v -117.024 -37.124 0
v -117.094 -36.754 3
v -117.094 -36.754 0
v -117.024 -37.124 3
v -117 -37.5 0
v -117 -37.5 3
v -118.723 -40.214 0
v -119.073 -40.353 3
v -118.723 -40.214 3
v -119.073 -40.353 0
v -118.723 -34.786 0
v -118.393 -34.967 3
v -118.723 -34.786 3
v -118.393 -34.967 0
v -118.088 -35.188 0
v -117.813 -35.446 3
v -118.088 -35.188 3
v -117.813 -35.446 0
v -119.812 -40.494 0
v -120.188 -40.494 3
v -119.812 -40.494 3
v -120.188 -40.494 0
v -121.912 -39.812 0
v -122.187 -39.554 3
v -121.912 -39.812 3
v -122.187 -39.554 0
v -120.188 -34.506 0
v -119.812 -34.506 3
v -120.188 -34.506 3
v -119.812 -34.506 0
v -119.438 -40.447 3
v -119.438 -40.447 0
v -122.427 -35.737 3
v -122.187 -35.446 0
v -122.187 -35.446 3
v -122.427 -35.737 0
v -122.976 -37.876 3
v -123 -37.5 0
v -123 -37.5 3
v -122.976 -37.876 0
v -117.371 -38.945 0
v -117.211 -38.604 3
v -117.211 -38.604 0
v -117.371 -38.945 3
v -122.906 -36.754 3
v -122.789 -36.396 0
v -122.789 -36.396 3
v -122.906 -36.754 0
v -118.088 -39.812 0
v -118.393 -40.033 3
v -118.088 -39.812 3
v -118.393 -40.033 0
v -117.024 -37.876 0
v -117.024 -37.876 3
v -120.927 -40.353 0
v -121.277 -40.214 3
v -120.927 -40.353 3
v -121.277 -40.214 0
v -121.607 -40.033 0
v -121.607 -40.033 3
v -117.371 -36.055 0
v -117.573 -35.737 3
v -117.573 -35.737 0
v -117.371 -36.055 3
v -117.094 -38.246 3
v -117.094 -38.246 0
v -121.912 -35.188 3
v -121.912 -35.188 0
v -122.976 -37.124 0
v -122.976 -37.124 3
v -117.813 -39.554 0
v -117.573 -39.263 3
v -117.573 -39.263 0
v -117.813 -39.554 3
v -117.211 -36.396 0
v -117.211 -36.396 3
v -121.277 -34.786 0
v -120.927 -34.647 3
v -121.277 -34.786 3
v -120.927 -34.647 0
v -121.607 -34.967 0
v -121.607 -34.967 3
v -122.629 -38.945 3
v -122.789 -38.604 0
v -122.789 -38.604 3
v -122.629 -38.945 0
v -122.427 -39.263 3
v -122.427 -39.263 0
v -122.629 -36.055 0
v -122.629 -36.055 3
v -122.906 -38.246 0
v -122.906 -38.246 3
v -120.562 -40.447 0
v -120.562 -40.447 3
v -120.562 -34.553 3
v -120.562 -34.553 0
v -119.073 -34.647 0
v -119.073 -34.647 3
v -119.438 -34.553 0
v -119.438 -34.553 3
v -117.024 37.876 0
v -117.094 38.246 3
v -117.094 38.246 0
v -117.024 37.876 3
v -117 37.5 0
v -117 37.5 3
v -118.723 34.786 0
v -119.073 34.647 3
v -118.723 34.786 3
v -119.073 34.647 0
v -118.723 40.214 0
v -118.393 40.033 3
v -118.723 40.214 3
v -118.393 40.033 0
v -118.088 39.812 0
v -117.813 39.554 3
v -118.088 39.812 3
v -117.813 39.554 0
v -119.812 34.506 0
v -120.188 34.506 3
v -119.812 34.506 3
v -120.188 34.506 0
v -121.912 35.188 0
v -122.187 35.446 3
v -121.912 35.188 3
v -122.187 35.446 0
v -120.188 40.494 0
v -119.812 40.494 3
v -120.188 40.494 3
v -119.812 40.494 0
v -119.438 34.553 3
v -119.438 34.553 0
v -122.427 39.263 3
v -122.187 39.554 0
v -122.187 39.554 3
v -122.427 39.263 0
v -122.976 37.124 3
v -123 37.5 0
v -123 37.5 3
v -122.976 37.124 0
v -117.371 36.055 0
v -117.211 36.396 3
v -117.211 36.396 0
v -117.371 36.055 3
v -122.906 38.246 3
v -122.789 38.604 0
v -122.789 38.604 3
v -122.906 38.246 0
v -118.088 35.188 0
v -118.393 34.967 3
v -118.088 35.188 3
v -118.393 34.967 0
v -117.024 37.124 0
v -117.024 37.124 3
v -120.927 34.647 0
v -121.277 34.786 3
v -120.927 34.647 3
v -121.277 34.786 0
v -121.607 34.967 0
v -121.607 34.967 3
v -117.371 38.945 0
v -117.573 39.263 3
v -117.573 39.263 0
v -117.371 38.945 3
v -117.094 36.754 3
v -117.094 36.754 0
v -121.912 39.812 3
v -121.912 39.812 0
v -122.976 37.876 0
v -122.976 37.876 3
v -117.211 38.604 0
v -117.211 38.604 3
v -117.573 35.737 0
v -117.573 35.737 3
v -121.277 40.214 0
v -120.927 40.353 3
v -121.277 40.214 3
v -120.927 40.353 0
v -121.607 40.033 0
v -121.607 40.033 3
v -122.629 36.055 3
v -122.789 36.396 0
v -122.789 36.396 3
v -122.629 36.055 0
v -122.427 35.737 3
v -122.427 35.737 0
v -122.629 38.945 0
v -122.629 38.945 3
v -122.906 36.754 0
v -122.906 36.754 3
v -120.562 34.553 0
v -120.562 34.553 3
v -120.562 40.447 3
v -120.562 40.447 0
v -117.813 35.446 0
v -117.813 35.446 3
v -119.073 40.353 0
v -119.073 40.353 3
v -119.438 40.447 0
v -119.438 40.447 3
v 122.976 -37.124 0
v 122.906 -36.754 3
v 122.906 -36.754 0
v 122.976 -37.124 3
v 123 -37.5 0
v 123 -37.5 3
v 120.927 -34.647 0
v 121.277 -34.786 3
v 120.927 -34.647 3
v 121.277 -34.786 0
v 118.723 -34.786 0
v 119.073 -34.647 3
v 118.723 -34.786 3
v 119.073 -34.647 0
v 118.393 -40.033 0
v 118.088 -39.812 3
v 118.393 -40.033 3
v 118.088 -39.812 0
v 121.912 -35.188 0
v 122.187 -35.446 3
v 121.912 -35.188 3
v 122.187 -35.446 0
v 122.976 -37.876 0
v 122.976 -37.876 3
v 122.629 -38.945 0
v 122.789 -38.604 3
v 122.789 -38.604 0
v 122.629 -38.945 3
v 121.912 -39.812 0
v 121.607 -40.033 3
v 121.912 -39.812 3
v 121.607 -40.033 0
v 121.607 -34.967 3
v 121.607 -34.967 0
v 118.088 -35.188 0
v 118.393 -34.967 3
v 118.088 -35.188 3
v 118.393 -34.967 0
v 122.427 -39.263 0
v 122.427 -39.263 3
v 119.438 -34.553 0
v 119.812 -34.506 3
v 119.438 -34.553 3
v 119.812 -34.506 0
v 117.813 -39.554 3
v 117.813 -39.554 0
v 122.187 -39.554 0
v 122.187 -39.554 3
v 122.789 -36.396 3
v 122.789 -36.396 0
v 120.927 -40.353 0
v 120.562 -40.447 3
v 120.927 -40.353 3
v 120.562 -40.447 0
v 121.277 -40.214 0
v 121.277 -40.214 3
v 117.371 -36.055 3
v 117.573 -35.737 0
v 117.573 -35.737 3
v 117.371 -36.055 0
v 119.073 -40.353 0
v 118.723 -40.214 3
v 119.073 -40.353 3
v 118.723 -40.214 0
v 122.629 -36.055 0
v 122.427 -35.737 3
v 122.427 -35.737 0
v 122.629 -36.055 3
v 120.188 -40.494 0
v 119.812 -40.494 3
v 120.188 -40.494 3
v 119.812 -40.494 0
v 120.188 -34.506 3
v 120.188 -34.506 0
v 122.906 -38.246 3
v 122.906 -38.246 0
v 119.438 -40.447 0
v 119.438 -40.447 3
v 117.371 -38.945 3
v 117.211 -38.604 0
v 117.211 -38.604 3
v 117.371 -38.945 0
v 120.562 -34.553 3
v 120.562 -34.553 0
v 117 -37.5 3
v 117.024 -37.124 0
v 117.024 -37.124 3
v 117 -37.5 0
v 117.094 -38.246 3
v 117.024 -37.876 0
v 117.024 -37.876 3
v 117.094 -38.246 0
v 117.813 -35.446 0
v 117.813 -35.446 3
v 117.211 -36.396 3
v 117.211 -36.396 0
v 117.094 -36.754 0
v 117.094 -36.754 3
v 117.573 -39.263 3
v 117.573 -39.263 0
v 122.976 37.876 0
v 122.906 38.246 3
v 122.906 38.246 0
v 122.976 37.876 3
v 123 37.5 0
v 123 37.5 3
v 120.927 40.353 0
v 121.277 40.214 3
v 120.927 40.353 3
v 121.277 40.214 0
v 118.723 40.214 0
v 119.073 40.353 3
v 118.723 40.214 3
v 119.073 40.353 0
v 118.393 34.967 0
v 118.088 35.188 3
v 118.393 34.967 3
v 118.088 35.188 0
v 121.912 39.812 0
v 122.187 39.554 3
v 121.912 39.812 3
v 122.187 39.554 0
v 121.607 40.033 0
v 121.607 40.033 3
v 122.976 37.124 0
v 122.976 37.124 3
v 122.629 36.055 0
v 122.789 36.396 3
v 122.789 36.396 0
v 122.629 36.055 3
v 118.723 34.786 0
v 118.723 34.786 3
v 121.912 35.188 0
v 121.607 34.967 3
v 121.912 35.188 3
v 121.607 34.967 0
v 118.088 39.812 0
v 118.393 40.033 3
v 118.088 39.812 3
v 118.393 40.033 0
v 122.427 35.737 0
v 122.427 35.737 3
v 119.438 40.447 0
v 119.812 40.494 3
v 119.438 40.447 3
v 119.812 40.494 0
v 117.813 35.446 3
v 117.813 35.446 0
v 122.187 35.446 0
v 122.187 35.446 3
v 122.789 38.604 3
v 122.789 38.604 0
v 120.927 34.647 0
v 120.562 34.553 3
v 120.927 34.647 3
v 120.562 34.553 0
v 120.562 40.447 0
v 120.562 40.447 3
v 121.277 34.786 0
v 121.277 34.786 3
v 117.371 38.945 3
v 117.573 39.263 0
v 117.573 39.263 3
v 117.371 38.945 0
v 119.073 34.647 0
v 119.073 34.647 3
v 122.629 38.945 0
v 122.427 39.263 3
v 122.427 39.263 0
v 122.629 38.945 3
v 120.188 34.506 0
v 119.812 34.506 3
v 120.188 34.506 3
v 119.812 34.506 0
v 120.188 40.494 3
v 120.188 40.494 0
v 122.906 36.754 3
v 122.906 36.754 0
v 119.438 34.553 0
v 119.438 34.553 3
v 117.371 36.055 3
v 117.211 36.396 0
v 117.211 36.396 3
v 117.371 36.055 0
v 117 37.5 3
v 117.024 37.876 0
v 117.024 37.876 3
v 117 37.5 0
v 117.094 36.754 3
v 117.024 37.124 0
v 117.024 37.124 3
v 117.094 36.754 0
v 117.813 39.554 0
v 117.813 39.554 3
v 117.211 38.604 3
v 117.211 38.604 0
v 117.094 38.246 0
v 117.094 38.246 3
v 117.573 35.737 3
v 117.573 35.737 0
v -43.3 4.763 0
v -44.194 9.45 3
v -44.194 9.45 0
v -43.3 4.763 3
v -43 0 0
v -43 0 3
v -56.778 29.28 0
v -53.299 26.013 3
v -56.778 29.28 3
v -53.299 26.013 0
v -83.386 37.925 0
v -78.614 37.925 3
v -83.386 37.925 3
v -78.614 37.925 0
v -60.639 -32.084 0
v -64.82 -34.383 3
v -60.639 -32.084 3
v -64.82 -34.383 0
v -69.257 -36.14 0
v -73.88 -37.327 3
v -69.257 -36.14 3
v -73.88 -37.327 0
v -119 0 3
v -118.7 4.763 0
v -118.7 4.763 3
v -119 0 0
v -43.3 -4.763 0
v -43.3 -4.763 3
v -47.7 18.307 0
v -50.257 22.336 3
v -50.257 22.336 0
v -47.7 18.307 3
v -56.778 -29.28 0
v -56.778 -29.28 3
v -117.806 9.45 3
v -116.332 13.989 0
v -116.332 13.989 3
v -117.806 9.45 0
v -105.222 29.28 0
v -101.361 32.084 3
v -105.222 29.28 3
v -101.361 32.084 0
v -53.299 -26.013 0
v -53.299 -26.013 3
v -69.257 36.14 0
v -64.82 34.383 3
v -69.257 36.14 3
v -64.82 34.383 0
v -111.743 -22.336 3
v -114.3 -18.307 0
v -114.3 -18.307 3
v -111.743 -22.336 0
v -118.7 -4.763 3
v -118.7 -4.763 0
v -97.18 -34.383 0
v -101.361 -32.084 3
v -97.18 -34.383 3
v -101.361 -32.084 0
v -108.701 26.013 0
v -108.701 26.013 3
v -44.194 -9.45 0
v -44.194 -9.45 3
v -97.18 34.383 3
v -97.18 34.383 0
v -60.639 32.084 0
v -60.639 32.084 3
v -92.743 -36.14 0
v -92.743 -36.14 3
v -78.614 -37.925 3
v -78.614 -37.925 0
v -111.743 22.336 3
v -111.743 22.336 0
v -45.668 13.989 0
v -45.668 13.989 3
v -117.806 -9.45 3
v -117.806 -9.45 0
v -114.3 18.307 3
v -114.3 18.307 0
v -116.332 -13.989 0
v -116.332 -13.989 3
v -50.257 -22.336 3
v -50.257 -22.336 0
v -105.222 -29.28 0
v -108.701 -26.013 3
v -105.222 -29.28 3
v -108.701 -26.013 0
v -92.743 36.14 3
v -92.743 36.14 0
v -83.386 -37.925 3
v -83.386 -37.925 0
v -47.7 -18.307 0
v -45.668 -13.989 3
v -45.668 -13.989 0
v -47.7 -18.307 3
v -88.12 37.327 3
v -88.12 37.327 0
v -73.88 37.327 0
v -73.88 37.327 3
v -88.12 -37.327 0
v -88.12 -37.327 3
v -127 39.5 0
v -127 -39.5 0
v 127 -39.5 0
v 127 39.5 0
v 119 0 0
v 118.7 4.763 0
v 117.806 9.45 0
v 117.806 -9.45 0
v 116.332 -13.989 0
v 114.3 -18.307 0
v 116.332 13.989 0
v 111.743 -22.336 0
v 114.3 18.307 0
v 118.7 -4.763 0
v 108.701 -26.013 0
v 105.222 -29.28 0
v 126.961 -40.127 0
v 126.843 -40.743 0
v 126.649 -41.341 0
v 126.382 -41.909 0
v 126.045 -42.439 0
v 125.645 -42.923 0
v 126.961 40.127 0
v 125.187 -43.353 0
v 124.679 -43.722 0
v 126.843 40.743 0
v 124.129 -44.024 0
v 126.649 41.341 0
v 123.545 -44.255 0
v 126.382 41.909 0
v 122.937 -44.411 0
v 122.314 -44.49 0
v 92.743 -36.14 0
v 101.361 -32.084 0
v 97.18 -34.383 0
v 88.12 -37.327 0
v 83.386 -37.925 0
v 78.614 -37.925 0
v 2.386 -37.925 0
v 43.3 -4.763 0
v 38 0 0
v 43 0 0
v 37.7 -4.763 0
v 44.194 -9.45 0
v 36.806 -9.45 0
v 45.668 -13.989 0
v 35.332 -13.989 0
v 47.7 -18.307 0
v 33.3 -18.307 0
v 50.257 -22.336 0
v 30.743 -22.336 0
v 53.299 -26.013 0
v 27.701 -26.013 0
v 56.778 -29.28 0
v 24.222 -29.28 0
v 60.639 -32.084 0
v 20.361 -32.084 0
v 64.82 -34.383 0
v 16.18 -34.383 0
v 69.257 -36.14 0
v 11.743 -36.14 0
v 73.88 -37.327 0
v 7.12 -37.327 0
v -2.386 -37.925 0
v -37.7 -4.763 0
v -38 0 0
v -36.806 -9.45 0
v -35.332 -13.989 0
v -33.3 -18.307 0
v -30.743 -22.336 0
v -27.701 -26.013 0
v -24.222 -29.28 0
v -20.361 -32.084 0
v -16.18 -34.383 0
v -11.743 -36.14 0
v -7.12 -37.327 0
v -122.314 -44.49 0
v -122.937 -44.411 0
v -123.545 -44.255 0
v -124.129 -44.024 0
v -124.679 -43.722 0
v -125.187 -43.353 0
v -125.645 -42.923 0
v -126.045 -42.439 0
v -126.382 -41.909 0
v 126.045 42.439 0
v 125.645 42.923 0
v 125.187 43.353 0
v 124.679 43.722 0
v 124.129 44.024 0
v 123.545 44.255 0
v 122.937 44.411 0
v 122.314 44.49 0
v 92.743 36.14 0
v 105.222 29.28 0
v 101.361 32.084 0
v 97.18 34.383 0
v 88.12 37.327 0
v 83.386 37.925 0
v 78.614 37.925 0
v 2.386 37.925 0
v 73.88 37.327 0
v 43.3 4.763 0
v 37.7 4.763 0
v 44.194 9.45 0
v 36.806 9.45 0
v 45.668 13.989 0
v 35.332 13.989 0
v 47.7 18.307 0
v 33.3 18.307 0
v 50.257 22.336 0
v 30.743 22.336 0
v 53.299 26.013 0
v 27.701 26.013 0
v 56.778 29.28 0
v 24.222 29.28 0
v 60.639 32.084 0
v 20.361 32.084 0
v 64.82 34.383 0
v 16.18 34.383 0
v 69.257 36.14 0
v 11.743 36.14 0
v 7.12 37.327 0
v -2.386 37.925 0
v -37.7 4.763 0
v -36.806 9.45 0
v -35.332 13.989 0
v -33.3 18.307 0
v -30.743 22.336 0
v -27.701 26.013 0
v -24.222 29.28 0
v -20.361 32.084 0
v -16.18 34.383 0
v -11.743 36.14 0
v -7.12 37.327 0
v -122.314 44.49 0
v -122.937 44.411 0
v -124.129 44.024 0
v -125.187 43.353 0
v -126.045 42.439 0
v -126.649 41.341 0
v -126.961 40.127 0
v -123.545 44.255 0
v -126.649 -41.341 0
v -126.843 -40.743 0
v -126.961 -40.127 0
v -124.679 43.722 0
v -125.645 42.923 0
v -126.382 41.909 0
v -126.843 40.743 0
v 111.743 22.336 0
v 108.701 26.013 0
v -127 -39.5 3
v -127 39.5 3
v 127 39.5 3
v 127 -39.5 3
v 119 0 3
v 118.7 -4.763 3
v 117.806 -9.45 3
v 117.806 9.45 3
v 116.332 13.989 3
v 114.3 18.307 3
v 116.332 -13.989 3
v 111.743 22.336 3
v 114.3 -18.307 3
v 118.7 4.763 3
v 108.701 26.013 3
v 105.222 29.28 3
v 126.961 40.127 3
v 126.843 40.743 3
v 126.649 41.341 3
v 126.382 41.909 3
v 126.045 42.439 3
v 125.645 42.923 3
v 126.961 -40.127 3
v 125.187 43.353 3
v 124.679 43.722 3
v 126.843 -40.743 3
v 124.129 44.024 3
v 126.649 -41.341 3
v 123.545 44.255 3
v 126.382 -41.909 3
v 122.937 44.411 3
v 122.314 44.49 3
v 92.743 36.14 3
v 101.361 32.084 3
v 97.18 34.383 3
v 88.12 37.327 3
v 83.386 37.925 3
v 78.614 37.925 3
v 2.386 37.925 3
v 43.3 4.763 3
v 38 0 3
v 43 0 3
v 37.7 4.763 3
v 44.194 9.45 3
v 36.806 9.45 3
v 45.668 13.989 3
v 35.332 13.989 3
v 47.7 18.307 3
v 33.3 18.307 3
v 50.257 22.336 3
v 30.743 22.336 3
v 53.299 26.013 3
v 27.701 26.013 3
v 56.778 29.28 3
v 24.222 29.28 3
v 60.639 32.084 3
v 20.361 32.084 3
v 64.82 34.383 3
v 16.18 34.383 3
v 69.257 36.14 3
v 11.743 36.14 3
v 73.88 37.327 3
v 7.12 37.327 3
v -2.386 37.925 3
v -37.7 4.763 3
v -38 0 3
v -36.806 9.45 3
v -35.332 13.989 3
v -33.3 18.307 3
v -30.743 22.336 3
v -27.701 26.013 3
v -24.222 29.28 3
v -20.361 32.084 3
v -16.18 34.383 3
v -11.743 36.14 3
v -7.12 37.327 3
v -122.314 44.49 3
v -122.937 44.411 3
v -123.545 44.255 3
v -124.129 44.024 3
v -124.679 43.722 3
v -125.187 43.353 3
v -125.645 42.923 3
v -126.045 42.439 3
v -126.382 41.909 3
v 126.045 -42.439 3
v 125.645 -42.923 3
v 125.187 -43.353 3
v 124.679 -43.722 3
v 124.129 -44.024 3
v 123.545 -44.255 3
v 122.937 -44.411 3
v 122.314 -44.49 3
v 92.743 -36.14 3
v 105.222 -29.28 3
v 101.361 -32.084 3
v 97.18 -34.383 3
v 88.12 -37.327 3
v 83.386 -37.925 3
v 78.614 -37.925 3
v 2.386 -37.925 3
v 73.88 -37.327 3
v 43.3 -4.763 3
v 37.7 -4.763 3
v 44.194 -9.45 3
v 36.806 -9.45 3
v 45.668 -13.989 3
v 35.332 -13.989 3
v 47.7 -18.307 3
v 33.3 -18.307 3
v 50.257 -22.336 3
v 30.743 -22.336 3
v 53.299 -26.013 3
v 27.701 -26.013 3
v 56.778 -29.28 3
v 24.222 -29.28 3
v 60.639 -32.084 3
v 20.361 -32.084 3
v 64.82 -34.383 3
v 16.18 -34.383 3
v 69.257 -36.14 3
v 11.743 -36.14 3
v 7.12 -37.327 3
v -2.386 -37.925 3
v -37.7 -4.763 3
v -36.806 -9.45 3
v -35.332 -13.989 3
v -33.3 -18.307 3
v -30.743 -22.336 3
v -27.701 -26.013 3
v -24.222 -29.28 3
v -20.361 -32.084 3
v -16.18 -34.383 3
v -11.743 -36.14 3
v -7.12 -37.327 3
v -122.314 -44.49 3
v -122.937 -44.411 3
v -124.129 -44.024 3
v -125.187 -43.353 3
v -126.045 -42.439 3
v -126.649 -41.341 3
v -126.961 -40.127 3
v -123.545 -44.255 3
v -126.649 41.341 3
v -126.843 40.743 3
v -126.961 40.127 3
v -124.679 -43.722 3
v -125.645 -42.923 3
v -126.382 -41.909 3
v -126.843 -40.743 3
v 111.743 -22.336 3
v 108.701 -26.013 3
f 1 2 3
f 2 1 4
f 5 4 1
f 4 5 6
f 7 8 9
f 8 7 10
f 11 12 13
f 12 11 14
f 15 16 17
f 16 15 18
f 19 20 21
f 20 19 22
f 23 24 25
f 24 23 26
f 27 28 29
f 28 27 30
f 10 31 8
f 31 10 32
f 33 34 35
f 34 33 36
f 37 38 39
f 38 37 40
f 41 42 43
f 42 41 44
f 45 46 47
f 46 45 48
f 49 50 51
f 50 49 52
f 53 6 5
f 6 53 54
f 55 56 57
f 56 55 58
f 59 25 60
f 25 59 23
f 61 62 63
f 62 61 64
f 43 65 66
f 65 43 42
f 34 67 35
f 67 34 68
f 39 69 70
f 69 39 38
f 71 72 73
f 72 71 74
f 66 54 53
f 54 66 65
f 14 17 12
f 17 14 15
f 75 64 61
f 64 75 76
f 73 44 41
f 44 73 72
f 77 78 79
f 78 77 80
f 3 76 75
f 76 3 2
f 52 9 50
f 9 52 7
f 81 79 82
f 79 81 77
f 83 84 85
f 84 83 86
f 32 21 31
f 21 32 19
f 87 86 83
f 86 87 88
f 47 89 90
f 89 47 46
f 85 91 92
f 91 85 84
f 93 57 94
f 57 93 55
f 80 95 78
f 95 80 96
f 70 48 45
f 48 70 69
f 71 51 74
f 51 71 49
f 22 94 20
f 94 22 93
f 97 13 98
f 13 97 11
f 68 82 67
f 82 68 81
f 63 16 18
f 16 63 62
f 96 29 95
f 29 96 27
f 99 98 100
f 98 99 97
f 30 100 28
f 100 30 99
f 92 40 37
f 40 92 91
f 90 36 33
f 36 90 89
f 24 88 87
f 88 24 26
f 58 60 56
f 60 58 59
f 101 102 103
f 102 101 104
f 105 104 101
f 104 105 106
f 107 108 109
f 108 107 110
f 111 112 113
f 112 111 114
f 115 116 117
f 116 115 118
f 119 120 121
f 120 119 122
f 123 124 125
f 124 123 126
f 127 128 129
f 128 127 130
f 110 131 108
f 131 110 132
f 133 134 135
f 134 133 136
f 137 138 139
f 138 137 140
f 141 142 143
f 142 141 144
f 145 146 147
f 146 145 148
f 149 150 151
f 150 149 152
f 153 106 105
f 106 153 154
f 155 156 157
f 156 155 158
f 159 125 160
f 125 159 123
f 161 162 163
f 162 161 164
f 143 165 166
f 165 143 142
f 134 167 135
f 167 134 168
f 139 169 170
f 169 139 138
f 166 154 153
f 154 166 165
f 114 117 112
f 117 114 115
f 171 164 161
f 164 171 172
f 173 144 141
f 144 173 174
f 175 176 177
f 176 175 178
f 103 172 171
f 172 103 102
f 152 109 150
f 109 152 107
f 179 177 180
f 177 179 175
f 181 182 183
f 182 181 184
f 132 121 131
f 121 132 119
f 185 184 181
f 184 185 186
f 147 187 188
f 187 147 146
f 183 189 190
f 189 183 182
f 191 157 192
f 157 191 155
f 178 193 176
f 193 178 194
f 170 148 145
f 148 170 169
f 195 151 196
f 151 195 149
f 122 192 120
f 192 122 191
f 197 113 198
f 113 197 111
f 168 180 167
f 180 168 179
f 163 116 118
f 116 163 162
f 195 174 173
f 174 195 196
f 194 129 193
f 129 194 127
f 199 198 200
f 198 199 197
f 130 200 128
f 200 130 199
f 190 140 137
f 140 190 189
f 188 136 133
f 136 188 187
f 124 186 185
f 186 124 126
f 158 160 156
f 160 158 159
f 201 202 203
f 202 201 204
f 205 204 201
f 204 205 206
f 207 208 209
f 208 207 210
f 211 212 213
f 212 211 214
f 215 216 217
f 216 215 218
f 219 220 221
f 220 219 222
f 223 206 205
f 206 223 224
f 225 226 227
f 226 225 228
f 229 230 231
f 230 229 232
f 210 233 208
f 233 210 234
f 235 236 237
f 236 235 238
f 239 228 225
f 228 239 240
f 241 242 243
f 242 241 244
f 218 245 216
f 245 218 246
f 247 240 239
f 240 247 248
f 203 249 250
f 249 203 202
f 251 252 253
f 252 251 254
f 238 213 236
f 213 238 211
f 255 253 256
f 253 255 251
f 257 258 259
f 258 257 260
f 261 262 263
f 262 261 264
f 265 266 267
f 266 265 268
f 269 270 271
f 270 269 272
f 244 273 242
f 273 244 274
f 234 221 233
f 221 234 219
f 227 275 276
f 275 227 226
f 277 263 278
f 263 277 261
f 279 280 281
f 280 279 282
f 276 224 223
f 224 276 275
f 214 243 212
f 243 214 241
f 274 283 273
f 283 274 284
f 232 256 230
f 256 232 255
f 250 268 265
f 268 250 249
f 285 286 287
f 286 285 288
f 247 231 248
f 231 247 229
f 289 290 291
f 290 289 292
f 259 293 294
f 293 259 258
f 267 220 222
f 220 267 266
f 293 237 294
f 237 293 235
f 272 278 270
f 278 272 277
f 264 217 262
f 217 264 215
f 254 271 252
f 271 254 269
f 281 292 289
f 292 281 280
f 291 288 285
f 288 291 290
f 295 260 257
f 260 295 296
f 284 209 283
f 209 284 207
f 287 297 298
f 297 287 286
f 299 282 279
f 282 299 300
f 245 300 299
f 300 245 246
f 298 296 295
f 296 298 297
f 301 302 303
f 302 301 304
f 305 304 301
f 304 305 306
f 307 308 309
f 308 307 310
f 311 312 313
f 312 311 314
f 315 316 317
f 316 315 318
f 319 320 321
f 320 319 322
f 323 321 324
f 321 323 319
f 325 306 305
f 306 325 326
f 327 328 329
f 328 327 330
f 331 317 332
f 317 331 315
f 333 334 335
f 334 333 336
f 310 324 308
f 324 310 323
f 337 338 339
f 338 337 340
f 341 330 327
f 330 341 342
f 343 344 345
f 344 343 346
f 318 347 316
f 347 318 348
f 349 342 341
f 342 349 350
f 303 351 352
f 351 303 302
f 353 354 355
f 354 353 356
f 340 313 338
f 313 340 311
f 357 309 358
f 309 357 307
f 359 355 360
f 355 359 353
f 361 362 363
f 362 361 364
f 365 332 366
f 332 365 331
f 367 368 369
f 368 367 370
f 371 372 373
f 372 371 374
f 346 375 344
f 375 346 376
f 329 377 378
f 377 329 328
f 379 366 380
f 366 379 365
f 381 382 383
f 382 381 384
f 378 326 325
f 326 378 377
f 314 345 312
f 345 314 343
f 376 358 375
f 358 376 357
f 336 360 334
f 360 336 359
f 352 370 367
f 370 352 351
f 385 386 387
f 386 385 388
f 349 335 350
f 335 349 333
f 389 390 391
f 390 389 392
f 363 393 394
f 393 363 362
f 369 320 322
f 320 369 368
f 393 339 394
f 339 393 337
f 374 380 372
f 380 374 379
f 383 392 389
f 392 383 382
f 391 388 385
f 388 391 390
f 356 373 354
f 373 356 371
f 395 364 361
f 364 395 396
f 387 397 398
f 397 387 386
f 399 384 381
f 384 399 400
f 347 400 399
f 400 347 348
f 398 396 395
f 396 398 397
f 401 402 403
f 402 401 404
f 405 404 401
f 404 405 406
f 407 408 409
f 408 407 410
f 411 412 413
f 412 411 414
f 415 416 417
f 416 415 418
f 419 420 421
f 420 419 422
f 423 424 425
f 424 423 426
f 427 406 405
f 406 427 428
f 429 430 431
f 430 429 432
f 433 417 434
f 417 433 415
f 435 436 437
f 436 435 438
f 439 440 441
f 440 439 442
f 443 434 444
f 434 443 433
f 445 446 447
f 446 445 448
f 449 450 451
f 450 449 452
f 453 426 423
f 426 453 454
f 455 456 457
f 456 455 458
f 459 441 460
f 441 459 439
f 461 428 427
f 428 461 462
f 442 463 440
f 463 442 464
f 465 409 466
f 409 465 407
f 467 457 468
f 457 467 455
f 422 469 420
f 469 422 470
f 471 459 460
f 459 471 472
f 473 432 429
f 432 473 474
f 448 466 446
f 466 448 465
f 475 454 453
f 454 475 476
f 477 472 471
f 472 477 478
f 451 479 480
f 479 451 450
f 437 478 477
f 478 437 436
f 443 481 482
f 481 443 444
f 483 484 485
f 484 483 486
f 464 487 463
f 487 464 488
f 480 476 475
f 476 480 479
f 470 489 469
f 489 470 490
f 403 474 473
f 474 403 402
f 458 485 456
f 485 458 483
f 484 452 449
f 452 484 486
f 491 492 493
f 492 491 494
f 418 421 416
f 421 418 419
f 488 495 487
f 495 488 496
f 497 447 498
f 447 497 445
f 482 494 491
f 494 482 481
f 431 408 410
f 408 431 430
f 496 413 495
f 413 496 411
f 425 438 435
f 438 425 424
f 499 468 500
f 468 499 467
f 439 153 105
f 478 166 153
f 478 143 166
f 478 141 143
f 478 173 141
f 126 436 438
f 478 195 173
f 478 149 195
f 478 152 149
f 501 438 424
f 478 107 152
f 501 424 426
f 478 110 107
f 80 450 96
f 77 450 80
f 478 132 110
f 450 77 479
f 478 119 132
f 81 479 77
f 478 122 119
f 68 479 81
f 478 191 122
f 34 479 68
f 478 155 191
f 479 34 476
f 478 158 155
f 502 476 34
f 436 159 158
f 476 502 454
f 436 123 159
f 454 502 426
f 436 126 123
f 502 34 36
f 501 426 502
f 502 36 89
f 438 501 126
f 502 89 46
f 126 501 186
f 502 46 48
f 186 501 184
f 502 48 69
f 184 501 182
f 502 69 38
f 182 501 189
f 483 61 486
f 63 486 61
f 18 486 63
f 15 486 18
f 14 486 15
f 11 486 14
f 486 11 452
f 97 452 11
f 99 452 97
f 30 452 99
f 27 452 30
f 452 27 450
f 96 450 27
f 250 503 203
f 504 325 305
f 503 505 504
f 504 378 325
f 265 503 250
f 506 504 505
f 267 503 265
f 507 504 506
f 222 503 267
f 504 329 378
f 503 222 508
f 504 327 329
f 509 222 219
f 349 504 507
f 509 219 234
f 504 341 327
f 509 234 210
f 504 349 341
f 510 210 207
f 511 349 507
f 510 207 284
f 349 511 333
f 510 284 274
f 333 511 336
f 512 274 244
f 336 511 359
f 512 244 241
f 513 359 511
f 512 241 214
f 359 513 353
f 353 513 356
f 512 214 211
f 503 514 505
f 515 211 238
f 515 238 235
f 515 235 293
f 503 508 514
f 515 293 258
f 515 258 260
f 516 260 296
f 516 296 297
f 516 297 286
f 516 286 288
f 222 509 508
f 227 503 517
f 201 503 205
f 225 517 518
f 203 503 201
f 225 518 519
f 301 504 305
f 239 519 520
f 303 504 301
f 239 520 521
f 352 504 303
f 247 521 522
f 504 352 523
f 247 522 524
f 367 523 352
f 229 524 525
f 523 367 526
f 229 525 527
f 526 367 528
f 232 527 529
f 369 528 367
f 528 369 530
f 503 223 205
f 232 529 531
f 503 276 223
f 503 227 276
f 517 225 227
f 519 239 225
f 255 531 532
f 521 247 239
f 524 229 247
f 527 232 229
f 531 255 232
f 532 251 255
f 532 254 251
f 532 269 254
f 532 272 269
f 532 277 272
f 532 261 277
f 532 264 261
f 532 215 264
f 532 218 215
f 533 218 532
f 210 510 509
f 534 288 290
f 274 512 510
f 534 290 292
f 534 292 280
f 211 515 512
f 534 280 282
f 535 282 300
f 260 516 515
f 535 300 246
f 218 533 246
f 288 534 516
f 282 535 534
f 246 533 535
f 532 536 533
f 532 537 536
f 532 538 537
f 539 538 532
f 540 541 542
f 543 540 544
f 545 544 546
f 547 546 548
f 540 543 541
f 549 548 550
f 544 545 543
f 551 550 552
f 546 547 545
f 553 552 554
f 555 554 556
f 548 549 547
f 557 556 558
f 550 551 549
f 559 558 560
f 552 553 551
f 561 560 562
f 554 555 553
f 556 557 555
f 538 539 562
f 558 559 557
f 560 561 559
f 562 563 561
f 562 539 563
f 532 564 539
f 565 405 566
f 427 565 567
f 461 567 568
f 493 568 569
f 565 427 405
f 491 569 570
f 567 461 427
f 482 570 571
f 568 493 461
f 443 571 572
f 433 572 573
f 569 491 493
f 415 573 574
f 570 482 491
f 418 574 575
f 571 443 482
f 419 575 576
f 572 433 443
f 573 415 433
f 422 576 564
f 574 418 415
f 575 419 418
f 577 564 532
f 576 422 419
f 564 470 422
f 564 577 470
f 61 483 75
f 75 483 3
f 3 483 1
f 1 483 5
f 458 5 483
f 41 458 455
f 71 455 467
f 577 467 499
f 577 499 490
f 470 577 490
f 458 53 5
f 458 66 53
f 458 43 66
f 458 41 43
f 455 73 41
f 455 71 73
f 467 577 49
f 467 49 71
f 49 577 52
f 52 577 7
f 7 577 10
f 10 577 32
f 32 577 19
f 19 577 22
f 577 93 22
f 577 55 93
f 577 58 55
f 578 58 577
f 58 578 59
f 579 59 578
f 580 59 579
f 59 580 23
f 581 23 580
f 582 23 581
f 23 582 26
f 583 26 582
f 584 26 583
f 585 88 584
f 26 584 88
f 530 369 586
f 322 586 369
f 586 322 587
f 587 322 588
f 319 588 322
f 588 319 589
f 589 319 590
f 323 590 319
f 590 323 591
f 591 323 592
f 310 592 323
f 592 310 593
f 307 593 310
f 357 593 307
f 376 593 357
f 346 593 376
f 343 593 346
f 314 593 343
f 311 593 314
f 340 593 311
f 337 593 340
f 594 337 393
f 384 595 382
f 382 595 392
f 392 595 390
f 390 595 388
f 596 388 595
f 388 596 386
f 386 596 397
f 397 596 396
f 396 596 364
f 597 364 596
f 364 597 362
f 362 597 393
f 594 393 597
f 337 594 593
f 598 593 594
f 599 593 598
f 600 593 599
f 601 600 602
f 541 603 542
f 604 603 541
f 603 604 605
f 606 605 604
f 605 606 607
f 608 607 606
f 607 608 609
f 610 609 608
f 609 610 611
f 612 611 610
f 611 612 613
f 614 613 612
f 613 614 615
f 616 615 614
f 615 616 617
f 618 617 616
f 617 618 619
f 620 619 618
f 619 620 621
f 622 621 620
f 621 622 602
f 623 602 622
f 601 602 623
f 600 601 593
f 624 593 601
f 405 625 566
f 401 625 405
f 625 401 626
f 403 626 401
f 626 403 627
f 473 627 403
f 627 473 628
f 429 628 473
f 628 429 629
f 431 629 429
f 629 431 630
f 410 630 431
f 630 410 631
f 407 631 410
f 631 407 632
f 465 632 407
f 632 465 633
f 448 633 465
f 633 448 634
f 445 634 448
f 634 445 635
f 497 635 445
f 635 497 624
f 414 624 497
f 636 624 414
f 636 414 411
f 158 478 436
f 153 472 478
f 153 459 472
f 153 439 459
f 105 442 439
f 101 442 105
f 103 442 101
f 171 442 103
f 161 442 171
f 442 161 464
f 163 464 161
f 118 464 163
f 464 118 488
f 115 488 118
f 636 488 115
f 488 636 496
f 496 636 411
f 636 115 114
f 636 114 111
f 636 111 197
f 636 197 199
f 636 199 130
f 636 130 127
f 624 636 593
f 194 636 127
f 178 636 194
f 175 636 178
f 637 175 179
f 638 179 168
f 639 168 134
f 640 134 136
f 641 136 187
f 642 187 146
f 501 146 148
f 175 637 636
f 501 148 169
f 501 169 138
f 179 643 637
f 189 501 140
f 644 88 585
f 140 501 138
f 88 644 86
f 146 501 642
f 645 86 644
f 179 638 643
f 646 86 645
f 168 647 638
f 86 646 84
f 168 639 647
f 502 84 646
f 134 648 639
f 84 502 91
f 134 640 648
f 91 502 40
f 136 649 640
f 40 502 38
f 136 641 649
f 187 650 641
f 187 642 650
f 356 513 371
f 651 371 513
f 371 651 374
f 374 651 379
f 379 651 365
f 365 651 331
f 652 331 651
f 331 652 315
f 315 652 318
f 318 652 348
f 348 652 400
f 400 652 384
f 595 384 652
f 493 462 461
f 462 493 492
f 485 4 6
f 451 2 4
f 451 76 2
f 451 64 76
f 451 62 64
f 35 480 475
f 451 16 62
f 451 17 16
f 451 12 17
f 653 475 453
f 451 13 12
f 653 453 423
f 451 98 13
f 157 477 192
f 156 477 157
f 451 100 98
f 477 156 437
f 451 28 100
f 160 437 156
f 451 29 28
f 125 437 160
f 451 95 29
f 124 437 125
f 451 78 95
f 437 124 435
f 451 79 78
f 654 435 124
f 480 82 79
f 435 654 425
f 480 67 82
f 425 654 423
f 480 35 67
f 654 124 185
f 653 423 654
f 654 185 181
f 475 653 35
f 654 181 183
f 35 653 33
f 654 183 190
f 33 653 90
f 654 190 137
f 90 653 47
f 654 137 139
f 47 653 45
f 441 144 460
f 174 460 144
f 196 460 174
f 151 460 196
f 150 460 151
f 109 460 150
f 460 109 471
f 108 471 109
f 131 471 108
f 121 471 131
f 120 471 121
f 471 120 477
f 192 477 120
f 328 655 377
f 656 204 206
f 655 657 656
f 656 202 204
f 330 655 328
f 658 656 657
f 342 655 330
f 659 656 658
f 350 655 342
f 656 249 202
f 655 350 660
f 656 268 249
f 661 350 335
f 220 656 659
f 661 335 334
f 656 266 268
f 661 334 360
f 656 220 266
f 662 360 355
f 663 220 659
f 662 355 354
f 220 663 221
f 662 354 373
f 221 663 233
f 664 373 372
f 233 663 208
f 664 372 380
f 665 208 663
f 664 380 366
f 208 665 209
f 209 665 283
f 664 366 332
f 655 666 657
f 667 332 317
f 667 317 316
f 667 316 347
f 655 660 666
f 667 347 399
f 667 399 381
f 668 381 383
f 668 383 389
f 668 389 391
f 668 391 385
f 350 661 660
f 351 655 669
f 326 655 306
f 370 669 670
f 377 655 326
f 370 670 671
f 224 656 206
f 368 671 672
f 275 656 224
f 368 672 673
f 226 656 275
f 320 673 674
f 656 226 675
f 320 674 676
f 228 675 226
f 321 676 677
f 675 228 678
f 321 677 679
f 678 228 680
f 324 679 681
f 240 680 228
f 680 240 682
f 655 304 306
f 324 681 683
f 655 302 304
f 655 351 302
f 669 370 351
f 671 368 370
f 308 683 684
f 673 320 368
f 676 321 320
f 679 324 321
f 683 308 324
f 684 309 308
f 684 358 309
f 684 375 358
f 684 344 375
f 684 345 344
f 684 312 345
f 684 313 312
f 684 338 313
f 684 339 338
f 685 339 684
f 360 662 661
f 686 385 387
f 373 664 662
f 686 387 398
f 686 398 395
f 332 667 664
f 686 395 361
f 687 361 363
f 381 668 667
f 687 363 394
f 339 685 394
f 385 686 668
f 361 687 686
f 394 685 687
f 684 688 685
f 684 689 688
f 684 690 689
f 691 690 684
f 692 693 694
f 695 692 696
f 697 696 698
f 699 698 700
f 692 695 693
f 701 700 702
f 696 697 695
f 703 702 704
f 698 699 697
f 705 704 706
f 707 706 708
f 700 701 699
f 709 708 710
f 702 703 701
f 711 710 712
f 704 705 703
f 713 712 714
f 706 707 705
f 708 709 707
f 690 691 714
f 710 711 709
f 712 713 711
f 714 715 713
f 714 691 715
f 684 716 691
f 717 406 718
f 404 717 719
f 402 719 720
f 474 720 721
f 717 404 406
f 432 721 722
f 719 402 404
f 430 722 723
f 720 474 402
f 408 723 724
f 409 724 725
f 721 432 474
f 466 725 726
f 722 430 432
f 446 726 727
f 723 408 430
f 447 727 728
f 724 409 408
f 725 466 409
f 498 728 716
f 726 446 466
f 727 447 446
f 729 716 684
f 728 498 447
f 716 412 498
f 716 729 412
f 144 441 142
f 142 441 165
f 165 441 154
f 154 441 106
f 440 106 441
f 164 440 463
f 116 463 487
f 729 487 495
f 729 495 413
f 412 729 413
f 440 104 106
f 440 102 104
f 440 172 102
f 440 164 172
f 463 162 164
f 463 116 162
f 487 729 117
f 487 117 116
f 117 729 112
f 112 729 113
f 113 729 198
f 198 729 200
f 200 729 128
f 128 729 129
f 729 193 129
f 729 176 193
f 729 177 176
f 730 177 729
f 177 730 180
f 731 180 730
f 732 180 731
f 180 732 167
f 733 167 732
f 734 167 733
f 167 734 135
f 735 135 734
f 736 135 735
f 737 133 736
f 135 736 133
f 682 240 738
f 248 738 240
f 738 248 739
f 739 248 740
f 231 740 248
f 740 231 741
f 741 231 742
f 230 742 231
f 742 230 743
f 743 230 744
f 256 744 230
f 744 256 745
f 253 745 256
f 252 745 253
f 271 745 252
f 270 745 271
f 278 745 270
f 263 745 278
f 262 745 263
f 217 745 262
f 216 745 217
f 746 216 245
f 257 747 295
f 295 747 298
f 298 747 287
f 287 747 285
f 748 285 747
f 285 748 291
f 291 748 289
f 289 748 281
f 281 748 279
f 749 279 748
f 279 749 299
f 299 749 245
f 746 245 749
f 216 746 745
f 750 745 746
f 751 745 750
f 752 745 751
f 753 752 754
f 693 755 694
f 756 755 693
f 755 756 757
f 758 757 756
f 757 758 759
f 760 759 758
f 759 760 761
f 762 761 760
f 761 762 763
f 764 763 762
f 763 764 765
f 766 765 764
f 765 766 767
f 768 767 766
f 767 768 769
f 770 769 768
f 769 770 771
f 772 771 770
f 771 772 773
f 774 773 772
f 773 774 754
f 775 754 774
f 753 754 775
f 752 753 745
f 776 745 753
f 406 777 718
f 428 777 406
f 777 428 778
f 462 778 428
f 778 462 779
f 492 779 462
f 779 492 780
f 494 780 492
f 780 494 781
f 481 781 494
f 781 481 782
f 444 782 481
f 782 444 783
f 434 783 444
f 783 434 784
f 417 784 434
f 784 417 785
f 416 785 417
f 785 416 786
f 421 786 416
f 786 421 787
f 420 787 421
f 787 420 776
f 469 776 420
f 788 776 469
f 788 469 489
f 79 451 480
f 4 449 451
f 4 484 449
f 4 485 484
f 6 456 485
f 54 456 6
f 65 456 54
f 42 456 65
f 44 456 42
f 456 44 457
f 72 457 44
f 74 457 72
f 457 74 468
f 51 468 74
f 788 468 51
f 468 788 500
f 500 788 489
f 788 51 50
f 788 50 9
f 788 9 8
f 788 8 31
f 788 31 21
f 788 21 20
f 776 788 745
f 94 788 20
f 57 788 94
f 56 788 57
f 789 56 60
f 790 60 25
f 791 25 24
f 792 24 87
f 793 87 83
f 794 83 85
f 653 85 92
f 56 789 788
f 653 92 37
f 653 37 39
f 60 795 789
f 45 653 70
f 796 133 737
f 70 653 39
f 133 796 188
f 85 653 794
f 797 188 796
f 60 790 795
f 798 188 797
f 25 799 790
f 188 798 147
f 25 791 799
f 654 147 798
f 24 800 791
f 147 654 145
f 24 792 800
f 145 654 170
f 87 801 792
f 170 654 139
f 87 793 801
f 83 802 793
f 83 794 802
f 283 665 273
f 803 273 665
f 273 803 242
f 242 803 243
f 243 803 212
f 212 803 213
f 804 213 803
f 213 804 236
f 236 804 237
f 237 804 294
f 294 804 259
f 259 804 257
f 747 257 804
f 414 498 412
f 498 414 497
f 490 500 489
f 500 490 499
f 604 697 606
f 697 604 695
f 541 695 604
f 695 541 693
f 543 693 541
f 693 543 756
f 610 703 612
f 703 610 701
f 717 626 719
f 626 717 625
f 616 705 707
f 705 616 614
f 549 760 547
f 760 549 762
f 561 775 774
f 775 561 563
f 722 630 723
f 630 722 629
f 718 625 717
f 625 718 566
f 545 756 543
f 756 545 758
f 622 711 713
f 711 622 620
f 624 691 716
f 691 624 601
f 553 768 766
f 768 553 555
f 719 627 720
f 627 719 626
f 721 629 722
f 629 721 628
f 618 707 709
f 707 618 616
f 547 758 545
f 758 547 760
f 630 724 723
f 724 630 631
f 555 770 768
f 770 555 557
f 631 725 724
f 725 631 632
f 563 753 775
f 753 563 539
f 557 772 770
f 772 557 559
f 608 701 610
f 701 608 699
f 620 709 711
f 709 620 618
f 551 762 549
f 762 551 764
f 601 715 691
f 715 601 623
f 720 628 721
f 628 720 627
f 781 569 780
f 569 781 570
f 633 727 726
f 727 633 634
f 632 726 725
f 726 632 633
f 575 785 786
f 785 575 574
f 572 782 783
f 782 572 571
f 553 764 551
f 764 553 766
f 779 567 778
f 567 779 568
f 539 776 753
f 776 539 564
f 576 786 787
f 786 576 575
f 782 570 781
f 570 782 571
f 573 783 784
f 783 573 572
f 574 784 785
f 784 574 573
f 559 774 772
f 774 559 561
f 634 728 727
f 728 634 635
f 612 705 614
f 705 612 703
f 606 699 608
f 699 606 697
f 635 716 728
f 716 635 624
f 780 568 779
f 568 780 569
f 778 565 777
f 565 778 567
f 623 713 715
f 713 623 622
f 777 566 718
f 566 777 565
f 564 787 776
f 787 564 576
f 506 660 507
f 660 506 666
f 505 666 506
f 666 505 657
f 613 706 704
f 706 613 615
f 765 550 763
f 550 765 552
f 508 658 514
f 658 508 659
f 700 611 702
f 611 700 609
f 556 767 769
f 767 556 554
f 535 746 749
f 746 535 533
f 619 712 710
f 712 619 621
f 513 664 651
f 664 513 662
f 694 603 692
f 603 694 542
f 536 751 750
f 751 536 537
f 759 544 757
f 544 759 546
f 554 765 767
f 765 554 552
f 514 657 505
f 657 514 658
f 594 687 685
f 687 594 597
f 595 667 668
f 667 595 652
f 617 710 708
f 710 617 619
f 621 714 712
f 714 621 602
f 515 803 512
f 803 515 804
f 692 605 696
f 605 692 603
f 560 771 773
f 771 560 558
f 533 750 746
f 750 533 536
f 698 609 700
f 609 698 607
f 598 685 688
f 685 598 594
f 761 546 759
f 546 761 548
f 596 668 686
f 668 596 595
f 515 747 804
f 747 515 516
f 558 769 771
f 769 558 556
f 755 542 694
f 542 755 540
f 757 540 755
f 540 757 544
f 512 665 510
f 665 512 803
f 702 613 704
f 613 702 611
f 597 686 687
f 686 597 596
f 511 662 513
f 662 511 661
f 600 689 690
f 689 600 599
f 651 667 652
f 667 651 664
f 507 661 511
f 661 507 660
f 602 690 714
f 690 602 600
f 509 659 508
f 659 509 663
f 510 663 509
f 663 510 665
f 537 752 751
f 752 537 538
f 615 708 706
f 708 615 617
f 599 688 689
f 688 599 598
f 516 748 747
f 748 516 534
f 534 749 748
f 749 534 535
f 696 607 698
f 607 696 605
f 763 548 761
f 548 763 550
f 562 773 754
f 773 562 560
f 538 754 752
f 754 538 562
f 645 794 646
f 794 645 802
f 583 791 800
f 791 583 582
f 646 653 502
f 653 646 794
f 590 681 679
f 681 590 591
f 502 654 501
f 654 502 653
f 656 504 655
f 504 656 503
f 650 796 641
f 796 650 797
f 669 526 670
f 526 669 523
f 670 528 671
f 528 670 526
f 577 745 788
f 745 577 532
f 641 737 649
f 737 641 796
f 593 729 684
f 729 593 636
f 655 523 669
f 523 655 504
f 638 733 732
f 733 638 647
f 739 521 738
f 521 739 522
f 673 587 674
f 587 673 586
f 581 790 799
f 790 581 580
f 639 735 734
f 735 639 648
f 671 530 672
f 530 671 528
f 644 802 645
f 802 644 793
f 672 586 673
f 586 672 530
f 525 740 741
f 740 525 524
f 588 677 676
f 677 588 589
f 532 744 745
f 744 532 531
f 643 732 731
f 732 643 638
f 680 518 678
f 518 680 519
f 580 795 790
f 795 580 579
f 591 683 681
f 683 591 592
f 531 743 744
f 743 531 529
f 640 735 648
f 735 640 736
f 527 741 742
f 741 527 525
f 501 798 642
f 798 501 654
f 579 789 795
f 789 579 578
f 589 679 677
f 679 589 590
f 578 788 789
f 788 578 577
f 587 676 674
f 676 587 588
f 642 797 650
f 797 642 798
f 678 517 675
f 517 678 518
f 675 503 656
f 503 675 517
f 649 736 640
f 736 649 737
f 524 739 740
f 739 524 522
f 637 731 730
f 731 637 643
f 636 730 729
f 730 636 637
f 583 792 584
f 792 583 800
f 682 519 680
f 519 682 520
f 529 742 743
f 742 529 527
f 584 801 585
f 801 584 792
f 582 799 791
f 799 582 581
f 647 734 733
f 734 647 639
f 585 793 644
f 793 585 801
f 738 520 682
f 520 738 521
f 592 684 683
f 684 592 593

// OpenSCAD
$fn = 50;


difference() {
	union() {
		hull() {
			translate(v = [-122.0000000000, 39.5000000000, 0]) {
				cylinder(h = 3, r = 5);
			}
			translate(v = [122.0000000000, 39.5000000000, 0]) {
				cylinder(h = 3, r = 5);
			}
			translate(v = [-122.0000000000, -39.5000000000, 0]) {
				cylinder(h = 3, r = 5);
			}
			translate(v = [122.0000000000, -39.5000000000, 0]) {
				cylinder(h = 3, r = 5);
			}
		}
	}
	union() {
		#translate(v = [-120.0000000000, -37.5000000000, -100.0000000000]) {
			cylinder(h = 200, r = 3.0000000000);
		}
		#translate(v = [-120.0000000000, 37.5000000000, -100.0000000000]) {
			cylinder(h = 200, r = 3.0000000000);
		}
		#translate(v = [120.0000000000, -37.5000000000, -100.0000000000]) {
			cylinder(h = 200, r = 3.0000000000);
		}
		#translate(v = [120.0000000000, 37.5000000000, -100.0000000000]) {
			cylinder(h = 200, r = 3.0000000000);
		}
		#translate(v = [-81.0000000000, 0, 0]) {
			cylinder(h = 3, r = 38.0000000000);
		}
		#cylinder(h = 3, r = 38.0000000000);
		#translate(v = [81.0000000000, 0, 0]) {
			cylinder(h = 3, r = 38.0000000000);
		}
	}
}
